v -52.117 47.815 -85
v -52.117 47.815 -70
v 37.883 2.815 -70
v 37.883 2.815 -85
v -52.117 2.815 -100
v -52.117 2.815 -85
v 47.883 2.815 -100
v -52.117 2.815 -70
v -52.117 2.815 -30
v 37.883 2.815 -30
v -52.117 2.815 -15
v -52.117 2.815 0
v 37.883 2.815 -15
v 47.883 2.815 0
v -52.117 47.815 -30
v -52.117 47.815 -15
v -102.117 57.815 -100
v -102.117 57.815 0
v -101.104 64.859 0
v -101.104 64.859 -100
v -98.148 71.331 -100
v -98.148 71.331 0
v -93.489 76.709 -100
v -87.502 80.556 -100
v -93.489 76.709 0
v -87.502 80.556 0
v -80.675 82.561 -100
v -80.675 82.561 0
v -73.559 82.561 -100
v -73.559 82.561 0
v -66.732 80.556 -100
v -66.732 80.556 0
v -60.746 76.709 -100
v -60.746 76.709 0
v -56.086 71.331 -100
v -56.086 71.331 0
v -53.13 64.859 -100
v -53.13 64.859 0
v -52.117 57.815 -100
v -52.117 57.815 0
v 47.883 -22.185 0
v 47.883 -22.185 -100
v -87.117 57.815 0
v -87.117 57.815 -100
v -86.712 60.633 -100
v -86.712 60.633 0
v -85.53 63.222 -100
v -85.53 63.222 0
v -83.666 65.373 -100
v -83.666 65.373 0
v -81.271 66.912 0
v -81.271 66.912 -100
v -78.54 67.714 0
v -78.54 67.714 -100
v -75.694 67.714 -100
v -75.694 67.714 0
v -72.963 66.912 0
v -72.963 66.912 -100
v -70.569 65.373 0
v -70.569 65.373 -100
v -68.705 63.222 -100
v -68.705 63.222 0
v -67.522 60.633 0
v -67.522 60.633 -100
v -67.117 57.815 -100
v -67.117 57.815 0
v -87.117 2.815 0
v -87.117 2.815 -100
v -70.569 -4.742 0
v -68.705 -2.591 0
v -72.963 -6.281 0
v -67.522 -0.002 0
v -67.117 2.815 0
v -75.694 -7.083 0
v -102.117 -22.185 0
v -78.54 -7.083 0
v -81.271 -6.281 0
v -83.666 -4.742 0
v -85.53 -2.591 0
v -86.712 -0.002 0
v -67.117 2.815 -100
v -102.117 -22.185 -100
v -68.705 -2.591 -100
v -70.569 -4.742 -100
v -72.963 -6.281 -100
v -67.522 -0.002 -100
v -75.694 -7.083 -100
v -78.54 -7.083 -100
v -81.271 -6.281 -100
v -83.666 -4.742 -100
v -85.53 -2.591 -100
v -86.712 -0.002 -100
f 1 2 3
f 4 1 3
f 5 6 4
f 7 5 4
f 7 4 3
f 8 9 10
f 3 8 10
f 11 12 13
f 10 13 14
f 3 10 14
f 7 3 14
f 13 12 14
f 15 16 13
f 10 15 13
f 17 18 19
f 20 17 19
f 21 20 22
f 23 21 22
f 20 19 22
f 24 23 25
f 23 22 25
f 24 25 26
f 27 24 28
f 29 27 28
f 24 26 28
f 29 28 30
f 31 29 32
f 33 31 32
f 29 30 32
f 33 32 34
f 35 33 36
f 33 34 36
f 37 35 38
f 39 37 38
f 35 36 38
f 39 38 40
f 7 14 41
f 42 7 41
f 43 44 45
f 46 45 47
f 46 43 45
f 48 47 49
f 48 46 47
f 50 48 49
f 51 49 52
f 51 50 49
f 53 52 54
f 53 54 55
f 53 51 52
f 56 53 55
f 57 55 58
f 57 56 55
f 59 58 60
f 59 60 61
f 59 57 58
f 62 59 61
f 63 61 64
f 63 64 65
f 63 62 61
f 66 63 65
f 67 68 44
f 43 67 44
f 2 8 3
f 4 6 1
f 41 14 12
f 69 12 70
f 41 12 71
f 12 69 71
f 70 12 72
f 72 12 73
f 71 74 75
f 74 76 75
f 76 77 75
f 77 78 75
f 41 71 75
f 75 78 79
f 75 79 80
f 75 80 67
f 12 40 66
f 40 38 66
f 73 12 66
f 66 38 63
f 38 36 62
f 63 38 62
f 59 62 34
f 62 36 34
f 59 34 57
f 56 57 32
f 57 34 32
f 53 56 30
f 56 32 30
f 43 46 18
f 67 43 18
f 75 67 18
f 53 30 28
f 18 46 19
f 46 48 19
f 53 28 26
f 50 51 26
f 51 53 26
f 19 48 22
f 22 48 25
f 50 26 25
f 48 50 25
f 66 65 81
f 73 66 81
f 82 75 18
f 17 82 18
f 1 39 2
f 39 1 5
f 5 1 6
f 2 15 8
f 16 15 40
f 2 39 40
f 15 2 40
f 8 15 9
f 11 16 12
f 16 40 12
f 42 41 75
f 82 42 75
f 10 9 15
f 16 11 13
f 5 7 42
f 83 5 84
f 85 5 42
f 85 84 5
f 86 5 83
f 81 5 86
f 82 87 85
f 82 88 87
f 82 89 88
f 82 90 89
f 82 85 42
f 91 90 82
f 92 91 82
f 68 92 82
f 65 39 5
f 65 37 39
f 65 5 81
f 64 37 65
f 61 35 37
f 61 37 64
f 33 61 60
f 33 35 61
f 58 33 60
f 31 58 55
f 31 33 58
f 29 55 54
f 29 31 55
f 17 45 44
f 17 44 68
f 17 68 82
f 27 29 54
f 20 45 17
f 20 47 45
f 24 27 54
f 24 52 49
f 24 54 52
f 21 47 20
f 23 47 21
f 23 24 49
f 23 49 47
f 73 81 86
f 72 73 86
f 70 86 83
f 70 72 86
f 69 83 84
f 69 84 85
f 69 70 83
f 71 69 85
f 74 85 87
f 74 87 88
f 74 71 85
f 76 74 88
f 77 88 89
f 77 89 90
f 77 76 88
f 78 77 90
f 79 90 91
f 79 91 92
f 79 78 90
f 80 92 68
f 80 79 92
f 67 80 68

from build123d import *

# Parameters (mm, degrees)
BOSS_EXTRUDE1_DEPTH = 100
SKETCH4_W           = 90
SKETCH4_H           = 70
BOSS_EXTRUDE2_DEPTH = 45
SKETCH5_W           = 40
SKETCH5_H           = 45
CUT_EXTRUDE1_DEPTH  = 90
CUT_EXTRUDE2_DEPTH  = 70


with BuildPart() as part:
    # Sketch1 → Boss-Extrude1 (new body)
    with BuildSketch(Plane.XY):
        with BuildLine():
            Line((-52.117117117, 57.815315315), (-52.117117117, 2.815315315))
            Line((-52.117117117, 2.815315315), (47.882882883, 2.815315315))
            Line((47.882882883, 2.815315315), (47.882882883, -22.184684685))
            Line((47.882882883, -22.184684685), (-102.117117117, -22.184684685))
            Line((-102.117117117, -22.184684685), (-102.117117117, 2.815315315))
            Line((-102.117117117, 2.815315315), (-102.117117117, 57.815315315))
            ThreePointArc((-102.117117117, 57.815315315), (-77.117117117, 82.815315315), (-52.117117117, 57.815315315))
        make_face()
        with BuildLine():
            Line((-67.117117117, 57.815315315), (-67.117117117, 2.815315315))
            ThreePointArc((-67.117117117, 2.815315315), (-77.117117117, -7.184684685), (-87.117117117, 2.815315315))
            Line((-87.117117117, 2.815315315), (-87.117117117, 57.815315315))
            ThreePointArc((-87.117117117, 57.815315315), (-77.117117117, 67.815315315), (-67.117117117, 57.815315315))
        make_face(mode=Mode.SUBTRACT)
    extrude(amount=-BOSS_EXTRUDE1_DEPTH)

    # Sketch4 → Boss-Extrude2 (add)
    with BuildSketch(Plane(origin=(0, 2.815315315, 0), x_dir=(1, 0, 0), z_dir=(0, 1, 0))):
        with Locations((-7.117117117, 50)):
            Rectangle(SKETCH4_W, SKETCH4_H)
    extrude(amount=BOSS_EXTRUDE2_DEPTH)

    # Sketch5 → Cut-Extrude1 (cut)
    with BuildSketch(Plane(origin=(37.882882883, 0, 0), x_dir=(0, 0, -1), z_dir=(1, 0, 0))):
        with Locations((50, 25.315315315)):
            Rectangle(SKETCH5_W, SKETCH5_H)
    extrude(amount=-CUT_EXTRUDE1_DEPTH, mode=Mode.SUBTRACT)

    # Sketch6 → Cut-Extrude2 (cut)
    with BuildSketch(Plane.XY.offset(-15)):
        Polygon((-52.117117117, 47.815315315), (37.882882883, 2.815315315), (37.882882883, 47.815315315), align=None)
    extrude(amount=-CUT_EXTRUDE2_DEPTH, mode=Mode.SUBTRACT)


solid = part.part
